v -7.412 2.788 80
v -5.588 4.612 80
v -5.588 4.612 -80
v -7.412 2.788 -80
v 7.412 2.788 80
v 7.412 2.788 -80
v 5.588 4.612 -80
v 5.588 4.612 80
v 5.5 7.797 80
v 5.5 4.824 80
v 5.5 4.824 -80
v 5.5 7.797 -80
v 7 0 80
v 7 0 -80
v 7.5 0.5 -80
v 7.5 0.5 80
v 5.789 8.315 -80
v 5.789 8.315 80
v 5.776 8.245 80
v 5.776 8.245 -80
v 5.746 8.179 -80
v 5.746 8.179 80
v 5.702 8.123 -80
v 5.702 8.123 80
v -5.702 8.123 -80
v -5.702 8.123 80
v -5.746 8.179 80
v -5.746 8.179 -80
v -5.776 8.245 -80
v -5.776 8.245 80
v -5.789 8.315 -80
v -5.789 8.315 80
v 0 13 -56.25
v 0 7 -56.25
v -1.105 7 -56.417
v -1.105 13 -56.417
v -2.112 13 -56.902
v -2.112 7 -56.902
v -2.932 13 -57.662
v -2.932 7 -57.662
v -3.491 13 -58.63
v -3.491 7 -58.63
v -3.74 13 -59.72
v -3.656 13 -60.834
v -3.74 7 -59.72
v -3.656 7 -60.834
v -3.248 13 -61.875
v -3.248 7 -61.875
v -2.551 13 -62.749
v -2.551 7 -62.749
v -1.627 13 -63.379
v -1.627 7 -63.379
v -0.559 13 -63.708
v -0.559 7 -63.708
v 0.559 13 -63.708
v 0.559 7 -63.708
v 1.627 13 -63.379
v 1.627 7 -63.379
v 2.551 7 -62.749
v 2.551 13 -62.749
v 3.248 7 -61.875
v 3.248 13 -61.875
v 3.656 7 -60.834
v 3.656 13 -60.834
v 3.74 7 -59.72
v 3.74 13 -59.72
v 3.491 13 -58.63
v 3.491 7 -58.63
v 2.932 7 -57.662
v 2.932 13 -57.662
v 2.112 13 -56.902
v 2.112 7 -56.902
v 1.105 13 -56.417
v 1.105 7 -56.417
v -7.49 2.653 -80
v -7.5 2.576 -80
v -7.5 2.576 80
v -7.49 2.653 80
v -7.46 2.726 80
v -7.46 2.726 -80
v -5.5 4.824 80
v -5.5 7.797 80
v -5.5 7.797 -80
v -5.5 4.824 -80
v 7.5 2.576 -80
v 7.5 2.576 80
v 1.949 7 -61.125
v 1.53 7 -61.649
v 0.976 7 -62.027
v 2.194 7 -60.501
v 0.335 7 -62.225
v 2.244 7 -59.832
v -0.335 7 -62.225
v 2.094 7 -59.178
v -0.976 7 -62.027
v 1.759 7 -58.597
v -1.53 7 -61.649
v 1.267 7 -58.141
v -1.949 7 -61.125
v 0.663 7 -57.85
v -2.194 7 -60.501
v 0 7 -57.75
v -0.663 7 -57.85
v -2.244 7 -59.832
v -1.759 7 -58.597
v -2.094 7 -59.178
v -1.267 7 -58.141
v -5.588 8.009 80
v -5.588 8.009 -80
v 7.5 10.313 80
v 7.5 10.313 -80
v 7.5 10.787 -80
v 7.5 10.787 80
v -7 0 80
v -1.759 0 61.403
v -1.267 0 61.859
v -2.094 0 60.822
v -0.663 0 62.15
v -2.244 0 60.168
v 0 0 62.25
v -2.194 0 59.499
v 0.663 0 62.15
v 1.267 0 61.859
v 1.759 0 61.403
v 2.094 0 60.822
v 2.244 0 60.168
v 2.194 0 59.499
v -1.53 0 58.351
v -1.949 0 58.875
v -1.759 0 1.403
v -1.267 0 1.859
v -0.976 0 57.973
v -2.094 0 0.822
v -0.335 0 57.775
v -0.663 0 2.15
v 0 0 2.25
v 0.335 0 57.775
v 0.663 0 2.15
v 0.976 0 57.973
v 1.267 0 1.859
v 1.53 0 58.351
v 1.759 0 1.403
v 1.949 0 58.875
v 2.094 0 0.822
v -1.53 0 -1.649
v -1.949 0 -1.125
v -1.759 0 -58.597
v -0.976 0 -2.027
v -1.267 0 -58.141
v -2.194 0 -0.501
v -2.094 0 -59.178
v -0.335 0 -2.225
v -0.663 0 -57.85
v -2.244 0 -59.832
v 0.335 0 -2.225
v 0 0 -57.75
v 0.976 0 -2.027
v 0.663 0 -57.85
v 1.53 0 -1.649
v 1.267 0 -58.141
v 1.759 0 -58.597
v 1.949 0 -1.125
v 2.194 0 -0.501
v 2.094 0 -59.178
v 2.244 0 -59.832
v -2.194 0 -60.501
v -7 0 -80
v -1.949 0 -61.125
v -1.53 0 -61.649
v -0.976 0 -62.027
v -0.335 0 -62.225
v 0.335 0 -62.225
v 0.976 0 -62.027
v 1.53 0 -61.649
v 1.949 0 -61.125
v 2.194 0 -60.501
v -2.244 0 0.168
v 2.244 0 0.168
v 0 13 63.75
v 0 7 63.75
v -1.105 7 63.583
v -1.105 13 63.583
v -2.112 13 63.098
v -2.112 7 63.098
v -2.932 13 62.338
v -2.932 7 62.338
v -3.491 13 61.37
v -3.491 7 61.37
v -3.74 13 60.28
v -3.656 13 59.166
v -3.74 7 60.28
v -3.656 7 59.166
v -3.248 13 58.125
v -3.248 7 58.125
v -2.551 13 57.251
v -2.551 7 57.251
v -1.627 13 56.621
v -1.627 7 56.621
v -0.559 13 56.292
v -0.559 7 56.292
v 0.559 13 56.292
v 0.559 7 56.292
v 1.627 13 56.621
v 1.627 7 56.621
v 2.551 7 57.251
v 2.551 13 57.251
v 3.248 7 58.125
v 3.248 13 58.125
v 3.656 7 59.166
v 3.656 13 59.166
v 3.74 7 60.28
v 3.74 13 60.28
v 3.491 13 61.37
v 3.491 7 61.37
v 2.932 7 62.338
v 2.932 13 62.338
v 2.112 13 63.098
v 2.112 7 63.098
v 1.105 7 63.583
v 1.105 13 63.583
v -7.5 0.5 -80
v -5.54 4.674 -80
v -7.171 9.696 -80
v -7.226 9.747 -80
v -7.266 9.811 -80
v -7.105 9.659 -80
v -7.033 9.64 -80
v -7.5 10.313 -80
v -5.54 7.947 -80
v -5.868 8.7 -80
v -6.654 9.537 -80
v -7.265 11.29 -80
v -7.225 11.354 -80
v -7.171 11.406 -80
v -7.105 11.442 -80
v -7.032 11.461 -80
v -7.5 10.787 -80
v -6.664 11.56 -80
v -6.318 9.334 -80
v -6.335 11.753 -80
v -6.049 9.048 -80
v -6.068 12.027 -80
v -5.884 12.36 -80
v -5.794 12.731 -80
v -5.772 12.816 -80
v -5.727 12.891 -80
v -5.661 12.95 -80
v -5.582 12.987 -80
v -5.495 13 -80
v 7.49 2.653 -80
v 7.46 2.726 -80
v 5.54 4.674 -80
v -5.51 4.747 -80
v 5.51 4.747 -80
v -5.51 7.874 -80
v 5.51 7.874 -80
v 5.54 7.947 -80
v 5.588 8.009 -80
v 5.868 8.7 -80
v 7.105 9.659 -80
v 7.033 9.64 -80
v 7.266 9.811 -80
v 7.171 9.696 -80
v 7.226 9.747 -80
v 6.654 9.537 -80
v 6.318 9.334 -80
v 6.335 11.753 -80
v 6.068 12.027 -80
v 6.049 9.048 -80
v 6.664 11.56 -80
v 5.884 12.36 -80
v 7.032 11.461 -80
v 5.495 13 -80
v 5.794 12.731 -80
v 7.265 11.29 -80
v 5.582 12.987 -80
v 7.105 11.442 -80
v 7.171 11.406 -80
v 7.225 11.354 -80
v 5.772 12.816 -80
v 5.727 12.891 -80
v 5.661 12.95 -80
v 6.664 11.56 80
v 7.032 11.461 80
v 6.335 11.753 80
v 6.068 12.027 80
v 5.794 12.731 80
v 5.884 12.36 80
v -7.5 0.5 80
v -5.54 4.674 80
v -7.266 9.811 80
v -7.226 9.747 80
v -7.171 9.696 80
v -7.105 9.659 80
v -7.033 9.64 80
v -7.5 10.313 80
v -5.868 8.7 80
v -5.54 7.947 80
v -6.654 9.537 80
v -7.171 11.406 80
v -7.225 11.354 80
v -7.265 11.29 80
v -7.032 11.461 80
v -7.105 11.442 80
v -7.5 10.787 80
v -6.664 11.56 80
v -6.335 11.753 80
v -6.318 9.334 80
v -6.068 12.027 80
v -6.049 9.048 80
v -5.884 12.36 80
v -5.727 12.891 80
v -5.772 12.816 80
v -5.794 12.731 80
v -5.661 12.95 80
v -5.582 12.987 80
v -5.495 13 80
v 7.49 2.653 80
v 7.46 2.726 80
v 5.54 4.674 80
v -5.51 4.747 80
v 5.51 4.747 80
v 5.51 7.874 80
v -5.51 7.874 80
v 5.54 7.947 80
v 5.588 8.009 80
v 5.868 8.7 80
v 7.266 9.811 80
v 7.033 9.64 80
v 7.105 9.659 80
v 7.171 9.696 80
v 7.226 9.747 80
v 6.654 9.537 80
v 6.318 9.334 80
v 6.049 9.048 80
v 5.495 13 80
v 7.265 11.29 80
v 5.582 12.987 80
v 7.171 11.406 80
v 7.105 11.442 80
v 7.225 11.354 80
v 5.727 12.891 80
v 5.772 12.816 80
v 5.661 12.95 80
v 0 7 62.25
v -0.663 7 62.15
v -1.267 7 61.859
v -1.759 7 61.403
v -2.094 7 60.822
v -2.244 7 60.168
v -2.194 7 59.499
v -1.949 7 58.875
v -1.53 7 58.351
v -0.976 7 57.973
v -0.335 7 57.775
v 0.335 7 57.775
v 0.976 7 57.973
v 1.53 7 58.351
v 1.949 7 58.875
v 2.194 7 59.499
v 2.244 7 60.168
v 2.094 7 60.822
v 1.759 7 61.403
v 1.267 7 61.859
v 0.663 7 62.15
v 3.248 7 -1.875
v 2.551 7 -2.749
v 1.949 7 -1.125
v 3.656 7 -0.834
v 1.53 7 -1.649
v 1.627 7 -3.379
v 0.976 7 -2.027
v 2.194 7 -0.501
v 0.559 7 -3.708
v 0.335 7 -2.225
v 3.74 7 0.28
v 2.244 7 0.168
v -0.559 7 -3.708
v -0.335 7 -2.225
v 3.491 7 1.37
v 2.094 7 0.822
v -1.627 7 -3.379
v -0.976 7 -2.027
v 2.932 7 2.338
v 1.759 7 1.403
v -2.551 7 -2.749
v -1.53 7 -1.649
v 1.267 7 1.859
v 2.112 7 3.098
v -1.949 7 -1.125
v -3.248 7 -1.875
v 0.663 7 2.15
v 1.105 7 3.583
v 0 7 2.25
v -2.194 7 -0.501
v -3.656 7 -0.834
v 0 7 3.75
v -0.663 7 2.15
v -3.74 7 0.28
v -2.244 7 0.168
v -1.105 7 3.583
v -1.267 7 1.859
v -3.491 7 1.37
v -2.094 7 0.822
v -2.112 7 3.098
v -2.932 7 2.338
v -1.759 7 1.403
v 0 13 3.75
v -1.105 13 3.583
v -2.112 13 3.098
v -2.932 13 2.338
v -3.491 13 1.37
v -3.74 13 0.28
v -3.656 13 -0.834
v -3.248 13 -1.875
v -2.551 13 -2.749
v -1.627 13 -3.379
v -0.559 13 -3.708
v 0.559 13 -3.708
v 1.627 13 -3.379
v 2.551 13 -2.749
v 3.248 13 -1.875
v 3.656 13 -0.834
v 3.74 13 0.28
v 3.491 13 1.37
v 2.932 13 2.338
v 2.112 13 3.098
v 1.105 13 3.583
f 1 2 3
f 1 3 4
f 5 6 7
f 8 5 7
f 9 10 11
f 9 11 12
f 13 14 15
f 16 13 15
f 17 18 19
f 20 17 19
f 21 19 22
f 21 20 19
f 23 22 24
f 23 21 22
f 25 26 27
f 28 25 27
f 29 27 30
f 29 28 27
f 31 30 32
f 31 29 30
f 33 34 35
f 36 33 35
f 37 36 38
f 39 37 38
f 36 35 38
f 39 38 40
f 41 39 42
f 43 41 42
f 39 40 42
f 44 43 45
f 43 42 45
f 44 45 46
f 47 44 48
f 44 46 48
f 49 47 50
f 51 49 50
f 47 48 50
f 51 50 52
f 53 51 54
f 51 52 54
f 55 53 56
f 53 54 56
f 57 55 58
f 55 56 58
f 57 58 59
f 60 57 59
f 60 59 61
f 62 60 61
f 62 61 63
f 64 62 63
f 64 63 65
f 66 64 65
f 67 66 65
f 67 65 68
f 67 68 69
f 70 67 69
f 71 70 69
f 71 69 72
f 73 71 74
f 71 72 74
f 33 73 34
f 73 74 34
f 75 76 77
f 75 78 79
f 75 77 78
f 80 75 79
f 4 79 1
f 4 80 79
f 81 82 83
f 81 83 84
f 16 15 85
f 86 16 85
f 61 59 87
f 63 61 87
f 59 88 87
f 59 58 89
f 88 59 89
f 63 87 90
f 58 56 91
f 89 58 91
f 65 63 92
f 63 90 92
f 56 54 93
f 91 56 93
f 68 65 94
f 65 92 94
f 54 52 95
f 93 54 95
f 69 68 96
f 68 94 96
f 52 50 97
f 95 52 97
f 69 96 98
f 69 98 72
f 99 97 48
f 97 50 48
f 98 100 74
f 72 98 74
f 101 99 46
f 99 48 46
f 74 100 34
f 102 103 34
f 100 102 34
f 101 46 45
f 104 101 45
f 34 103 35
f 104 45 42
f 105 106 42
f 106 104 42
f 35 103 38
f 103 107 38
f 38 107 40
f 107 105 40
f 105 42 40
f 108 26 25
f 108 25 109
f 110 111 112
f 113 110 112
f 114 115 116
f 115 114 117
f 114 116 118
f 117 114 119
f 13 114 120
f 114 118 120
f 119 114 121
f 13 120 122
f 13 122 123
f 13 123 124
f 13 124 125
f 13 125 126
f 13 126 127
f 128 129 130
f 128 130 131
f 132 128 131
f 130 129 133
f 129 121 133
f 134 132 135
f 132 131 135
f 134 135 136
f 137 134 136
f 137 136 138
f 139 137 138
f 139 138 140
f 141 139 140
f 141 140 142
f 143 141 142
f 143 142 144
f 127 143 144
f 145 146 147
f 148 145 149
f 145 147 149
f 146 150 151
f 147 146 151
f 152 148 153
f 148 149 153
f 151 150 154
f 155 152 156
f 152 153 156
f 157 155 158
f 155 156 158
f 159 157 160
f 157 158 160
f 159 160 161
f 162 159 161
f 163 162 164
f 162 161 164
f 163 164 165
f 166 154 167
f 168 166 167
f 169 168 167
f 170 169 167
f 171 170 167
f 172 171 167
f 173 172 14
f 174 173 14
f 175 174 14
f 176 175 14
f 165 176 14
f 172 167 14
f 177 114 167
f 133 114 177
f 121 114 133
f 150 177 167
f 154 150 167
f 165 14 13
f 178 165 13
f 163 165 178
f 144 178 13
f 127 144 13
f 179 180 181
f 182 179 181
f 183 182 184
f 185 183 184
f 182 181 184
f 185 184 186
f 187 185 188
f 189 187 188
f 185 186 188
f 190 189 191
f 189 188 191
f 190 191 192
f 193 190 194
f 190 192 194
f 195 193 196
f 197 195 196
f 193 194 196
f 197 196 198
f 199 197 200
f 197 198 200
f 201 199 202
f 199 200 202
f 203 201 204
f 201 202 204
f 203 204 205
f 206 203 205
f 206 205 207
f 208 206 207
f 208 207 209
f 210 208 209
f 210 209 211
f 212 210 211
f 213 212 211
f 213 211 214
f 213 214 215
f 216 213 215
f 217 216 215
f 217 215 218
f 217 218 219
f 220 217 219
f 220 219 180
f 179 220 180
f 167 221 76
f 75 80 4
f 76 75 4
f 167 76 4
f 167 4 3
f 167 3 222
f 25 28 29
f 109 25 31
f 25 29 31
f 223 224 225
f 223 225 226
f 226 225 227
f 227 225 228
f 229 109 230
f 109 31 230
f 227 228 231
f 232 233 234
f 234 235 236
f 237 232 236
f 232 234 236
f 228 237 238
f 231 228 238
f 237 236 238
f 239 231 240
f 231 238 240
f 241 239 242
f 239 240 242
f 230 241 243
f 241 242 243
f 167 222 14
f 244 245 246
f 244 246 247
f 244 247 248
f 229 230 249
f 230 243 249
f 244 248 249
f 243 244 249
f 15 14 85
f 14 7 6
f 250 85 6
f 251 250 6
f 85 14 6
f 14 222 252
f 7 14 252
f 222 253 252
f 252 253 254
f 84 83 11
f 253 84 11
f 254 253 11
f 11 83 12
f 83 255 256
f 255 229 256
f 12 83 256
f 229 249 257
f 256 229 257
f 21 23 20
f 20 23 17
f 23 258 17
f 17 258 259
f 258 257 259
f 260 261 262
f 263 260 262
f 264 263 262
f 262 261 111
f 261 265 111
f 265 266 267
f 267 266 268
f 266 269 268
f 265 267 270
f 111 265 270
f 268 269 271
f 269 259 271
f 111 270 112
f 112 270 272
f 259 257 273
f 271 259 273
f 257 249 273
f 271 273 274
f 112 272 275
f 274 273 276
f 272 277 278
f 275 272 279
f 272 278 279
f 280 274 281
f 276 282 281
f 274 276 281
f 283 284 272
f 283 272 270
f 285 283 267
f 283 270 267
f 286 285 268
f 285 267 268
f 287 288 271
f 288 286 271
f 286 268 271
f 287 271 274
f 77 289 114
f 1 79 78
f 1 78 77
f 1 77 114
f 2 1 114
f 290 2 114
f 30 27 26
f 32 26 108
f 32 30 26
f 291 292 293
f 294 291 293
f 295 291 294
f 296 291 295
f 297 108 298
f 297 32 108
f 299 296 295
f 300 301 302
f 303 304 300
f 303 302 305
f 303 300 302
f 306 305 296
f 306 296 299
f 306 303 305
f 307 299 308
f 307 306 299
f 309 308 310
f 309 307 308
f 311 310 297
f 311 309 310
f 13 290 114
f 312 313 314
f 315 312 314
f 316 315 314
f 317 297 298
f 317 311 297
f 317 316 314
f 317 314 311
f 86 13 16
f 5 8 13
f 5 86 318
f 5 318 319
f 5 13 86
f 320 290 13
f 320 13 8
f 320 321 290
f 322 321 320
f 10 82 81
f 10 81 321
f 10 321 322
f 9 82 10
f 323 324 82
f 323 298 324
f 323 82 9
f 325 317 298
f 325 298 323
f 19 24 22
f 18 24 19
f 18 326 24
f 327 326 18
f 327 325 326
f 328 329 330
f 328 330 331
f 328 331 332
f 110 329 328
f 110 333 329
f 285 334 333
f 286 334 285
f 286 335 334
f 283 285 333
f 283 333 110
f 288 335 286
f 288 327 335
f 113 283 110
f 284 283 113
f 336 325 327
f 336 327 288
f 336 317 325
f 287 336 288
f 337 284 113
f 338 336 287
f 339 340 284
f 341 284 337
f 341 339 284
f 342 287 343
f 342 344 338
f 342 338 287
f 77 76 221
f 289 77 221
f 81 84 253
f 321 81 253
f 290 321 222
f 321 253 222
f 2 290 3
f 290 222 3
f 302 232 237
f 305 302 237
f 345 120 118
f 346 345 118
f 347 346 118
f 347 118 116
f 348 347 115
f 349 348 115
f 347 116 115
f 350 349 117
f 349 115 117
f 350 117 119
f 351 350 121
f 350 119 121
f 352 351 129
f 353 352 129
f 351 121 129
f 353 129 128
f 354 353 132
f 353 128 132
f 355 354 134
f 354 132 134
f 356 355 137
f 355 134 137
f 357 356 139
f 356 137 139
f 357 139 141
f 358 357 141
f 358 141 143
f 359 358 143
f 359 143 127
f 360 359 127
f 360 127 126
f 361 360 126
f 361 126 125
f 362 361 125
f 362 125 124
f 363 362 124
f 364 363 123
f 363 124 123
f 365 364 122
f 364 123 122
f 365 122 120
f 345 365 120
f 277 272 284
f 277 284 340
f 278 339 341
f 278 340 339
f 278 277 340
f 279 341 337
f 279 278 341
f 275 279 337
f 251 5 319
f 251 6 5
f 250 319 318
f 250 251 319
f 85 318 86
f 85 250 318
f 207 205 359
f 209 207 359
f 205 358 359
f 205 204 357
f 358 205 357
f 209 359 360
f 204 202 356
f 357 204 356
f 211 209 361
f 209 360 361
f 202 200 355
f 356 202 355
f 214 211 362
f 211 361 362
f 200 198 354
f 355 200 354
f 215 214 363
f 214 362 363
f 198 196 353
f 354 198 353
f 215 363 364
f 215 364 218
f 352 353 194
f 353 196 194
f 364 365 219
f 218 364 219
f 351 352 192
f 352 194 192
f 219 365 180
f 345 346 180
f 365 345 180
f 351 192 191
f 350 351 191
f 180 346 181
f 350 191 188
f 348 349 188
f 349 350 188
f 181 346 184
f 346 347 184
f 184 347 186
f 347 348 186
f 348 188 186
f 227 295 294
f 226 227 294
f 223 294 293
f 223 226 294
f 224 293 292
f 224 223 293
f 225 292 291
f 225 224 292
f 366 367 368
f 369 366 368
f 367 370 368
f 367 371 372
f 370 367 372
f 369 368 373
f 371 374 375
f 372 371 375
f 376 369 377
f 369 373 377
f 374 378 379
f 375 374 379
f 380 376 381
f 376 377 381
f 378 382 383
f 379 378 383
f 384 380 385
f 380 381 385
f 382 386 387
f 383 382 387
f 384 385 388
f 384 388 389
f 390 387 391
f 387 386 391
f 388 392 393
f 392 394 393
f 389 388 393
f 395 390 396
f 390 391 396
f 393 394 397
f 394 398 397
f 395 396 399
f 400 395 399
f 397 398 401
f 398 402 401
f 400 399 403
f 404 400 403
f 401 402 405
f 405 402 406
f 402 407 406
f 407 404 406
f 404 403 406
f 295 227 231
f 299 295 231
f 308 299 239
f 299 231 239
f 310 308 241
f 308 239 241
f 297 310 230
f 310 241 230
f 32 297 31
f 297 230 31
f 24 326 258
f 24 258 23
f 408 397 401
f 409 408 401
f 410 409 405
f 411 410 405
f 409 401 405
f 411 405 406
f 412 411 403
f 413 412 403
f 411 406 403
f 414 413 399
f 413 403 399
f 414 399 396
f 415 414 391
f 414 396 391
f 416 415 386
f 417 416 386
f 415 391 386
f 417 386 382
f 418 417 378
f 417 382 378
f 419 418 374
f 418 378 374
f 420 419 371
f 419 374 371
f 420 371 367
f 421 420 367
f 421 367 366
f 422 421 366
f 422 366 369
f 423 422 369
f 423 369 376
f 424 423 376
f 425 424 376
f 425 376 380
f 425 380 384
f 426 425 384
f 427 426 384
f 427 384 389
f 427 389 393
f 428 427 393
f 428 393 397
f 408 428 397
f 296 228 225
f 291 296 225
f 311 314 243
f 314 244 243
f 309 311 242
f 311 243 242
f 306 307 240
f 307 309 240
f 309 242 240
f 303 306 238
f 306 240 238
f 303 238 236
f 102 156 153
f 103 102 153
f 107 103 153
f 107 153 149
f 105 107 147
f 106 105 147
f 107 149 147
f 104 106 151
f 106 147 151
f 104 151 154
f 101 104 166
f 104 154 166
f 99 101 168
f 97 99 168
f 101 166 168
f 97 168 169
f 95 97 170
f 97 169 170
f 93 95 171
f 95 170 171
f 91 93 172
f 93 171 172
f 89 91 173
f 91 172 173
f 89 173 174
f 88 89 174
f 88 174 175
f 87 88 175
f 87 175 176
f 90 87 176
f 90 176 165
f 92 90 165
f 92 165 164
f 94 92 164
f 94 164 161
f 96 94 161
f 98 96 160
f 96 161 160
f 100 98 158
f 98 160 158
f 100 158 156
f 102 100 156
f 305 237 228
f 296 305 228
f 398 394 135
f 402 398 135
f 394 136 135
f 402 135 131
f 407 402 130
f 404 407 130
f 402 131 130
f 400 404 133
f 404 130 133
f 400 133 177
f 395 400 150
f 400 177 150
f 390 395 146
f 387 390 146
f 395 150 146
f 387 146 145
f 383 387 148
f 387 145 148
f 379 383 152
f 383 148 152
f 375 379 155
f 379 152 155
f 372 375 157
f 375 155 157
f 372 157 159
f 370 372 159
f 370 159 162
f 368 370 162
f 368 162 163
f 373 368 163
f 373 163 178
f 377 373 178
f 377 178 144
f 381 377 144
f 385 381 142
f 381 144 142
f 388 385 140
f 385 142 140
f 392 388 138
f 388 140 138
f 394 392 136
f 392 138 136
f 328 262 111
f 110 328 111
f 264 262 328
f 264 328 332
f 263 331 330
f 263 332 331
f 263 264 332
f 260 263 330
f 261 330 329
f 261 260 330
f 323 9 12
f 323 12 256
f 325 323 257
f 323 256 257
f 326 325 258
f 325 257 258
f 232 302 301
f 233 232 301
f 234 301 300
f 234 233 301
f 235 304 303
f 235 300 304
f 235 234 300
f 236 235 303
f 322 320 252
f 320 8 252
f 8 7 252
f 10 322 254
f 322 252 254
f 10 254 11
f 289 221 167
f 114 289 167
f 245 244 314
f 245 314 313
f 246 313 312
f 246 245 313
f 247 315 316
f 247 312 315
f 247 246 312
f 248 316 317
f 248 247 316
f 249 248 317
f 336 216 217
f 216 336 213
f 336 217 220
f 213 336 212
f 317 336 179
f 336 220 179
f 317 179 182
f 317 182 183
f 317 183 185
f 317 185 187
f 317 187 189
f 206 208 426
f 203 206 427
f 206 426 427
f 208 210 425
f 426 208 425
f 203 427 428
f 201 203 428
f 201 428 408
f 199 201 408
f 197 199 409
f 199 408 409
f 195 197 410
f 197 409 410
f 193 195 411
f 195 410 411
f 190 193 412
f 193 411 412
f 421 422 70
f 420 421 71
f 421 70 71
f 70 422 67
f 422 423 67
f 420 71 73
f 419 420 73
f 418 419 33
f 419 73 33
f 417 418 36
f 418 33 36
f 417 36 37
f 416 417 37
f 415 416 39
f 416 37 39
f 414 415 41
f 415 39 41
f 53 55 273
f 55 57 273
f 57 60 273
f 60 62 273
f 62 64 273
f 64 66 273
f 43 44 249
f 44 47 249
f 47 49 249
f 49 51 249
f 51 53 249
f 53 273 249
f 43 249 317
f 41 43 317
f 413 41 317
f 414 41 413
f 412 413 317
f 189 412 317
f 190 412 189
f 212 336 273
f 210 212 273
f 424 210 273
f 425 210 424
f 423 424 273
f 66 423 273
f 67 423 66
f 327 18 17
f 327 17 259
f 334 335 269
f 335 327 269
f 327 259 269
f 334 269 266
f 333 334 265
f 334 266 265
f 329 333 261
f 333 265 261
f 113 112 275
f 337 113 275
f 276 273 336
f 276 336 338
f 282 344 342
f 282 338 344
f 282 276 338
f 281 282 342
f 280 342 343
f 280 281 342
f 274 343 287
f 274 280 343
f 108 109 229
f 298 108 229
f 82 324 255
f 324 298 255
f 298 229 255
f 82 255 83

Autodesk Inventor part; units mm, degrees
sketch "Sketch_2" plane through (0, 0, 0) normal (0, 0, 1) x (1, 0, 0)
  line L0 (-7.5, 10.787) -> (-7.5, 10.313)
  line L1 (-7.5, 10.313) -> (-7.2658, 9.8108)
  arc A0 (-7.2658, 9.8108) -> (-7.0326, 9.6401) centre (-6.9939, 9.9376) ccw
  arc A1 (-5.7891, 8.3153) -> (-7.0326, 9.6401) centre (-7.217, 8.221) ccw
  arc A2 (-5.7891, 8.3153) -> (-5.7019, 8.1229) centre (-5.4898, 8.335) ccw
  line L2 (-5.7019, 8.1229) -> (-5.5879, 8.0089)
  arc A3 (-5.5, 7.7967) -> (-5.5879, 8.0089) centre (-5.8, 7.7967) ccw
  line L3 (-5.5, 7.7967) -> (-5.5, 4.8243)
  arc A4 (-5.5879, 4.6121) -> (-5.5, 4.8243) centre (-5.8, 4.8243) ccw
  line L4 (-5.5879, 4.6121) -> (-7.4121, 2.7879)
  arc A5 (-7.4121, 2.7879) -> (-7.5, 2.5757) centre (-7.2, 2.5757) ccw
  line L5 (-7.5, 2.5757) -> (-7.5, 0.5)
  line L6 (-7.5, 0.5) -> (-7, 0)
  line L7 (-7, 0) -> (7, 0)
  line L8 (7, 0) -> (7.5, 0.5)
  line L9 (7.5, 0.5) -> (7.5, 2.5757)
  arc A6 (7.5, 2.5757) -> (7.4121, 2.7879) centre (7.2, 2.5757) ccw
  line L10 (7.4121, 2.7879) -> (5.5879, 4.6121)
  arc A7 (5.5, 4.8243) -> (5.5879, 4.6121) centre (5.8, 4.8243) ccw
  line L11 (5.5, 4.8243) -> (5.5, 7.7967)
  arc A8 (5.5879, 8.0089) -> (5.5, 7.7967) centre (5.8, 7.7967) ccw
  line L12 (5.5879, 8.0089) -> (5.7019, 8.1229)
  arc A9 (5.7019, 8.1229) -> (5.7891, 8.3153) centre (5.4898, 8.335) ccw
  arc A10 (7.0326, 9.6401) -> (5.7891, 8.3153) centre (7.217, 8.221) ccw
  arc A11 (7.0326, 9.6401) -> (7.2658, 9.8108) centre (6.9939, 9.9376) ccw
  line L13 (7.2658, 9.8108) -> (7.5, 10.313)
  line L14 (7.5, 10.313) -> (7.5, 10.787)
  line L15 (7.5, 10.787) -> (7.2653, 11.2903)
  arc A12 (7.2653, 11.2903) -> (7.0322, 11.461) centre (6.9934, 11.1635) ccw
  arc A13 (5.7938, 12.7312) -> (7.0322, 11.461) centre (7.217, 12.88) ccw
  arc A14 (5.7938, 12.7312) -> (5.4954, 13) centre (5.4954, 12.7) ccw
  line L16 (5.4954, 13) -> (-5.4954, 13)
  arc A15 (-5.4954, 13) -> (-5.7938, 12.7312) centre (-5.4954, 12.7) ccw
  arc A16 (-7.0322, 11.461) -> (-5.7938, 12.7312) centre (-7.217, 12.88) ccw
  arc A17 (-7.0322, 11.461) -> (-7.2653, 11.2903) centre (-6.9934, 11.1635) ccw
  line L17 (-7.2653, 11.2903) -> (-7.5, 10.787)
extrude "Extrusion1" add sketch "Sketch_2" along normal mid plane 160
sketch "Sketch2" plane through (-5.4954, 13, 80) normal (0, 1, 0) x (1, 0, 0)
  point P0 (5.4954, 20)
hole "Hole1" at (0, 13, 60) direction (0, -1, 0) diameter 4.5 depth 13 counterbore diameter 7.5 counterbore depth 6
pattern_linear "Rectangular Pattern1" count 3 spacing 60 along (0, 0, -1) of "Hole1"
ref_plane "to_block_1_XY" through (0, 13, 0) normal (0, 0, -1) x (1, 0, 0)
ref_plane "to_block_1_YZ" through (0, 13, 0) normal (1, 0, 0) x (0, -1, 0)
ref_plane "to_block_1_ZX" through (0, 13, 0) normal (0, -1, 0) x (0, 0, -1)
properties part number "C-SXR24-160_r"
